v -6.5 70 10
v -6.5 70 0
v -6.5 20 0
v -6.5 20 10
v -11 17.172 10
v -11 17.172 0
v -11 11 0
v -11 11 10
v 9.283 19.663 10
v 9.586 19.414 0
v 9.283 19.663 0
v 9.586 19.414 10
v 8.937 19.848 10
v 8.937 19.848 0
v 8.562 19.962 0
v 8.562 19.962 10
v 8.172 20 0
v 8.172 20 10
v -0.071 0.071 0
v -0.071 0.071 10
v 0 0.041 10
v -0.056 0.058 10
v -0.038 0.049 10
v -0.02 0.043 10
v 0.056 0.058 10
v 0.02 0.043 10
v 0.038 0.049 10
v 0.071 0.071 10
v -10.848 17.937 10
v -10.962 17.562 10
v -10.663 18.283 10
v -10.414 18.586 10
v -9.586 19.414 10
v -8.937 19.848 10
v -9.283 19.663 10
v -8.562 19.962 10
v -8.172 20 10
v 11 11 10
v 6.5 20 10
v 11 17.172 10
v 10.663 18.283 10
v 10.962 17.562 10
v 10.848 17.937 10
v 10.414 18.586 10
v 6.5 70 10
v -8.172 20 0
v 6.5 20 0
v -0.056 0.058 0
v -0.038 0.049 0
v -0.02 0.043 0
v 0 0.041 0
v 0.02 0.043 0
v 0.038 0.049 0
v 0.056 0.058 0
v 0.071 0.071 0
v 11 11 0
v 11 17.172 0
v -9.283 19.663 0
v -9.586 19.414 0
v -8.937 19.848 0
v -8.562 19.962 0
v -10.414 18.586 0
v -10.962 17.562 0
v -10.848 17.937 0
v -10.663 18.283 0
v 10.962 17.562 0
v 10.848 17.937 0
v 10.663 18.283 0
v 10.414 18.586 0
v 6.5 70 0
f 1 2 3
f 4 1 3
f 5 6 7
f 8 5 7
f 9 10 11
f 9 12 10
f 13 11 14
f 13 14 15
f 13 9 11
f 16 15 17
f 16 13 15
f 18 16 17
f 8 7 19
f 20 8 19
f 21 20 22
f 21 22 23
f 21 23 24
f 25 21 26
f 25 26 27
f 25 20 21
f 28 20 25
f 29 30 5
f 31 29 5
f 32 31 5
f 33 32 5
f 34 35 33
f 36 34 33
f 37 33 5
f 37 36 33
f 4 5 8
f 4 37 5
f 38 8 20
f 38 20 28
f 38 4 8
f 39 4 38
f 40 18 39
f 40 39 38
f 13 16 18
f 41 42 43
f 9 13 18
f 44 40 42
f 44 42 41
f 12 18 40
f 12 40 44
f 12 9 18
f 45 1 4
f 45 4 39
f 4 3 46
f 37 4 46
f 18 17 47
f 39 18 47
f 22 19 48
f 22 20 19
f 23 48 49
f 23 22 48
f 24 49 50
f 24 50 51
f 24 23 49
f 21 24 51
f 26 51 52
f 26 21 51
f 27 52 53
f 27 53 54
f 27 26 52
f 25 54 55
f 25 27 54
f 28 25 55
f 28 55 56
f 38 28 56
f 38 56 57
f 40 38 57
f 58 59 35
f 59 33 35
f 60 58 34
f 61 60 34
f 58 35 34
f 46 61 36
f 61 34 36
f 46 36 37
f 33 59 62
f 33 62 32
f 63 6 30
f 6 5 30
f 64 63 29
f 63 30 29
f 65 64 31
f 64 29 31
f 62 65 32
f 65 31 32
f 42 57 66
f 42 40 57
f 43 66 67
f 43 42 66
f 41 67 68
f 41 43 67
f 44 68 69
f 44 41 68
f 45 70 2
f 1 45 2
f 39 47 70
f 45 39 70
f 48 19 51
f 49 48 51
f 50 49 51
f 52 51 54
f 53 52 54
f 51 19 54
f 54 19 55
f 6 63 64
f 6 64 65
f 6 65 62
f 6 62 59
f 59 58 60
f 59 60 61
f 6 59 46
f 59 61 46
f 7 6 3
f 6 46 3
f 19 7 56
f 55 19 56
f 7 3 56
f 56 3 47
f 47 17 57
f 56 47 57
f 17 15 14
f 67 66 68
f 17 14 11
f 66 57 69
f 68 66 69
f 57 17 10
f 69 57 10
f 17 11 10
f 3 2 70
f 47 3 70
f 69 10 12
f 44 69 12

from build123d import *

# Parameters (mm, degrees)
F1_DEPTH = 10
F2_R     = 0.1
F3_SIZE  = 2
F4_R     = 2


with BuildPart() as f1:
    # F0 (on Top) → F1 (new body)
    with BuildSketch(Plane.XY):
        Polygon((6.5, 20), (6.5, 70), (0, 70), (-6.5, 70), (-6.5, 20), (-11, 20), (-11, 11), (0, 0), (11, 11), (11, 20), align=None)
    extrude(amount=F1_DEPTH)

    # F2
    f2_edges = [f1.edges().sort_by_distance(p)[0] for p in [
        (0, 0, 5),
    ]]
    fillet(f2_edges, radius=F2_R)

    # F3
    f3_edges = [f1.edges().sort_by_distance(p)[0] for p in [
        (-11, 20, 5),
        (11, 20, 5),
    ]]
    chamfer(f3_edges, length=F3_SIZE)

    # F4
    f4_edges = [f1.edges().sort_by_distance(p)[0] for p in [
        (9, 20, 5),
        (11, 18, 5),
        (-9, 20, 5),
        (-11, 18, 5),
    ]]
    fillet(f4_edges, radius=F4_R)


solid = f1.part
